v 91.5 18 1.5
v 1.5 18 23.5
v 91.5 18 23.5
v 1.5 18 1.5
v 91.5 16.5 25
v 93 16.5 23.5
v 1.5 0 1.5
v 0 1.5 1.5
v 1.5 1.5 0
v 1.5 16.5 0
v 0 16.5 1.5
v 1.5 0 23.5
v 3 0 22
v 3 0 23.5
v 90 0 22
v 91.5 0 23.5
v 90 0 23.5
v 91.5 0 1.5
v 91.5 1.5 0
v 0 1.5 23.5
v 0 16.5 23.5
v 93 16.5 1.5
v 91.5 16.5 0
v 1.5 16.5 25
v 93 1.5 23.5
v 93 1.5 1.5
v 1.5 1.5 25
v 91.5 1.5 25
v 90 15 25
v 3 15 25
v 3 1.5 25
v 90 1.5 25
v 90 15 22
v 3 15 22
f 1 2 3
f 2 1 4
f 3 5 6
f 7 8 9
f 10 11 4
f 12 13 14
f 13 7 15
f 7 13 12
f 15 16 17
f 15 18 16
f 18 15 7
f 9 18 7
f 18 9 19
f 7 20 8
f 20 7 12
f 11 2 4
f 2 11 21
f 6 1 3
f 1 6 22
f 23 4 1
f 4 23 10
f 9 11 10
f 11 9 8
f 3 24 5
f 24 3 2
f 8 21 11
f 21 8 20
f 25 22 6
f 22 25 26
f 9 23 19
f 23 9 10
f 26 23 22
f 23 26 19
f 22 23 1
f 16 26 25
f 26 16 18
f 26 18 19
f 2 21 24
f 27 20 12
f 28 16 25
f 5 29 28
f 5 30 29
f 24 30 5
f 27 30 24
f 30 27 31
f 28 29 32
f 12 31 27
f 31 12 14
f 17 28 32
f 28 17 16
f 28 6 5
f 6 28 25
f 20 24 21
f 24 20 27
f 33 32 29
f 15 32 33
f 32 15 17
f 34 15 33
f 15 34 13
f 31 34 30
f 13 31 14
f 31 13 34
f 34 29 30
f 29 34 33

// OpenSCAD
// Qi-charger riser for the Galaxy Fold 8.
//
// Standalone solid block that the phone rests on top of. It's not attached
// to PhoneHolder.scad - it just sits on the table/charging pad and lifts
// the phone up by block_height so the phone's Qi coil lines up with the
// charger underneath. A thin lip traces 3 edges of the top face to keep
// the phone from sliding off; the 4th (long) side is left open/flush.
//
// Shape (top view of the lip, sitting on top of the solid block):
//
//   ┌───────────────────────────────────┐  <- closed lip (phone_width long)
//   │ lip                          lip  │     end lips (phone_depth long)
//   └───────────────────────────────────┘
//        ^ open long side - no lip here, flush with the block edge
//
// Built as a single chamfered outer block (outer_width x outer_depth x
// outer_height) with a notch subtracted from the top: everywhere except a
// `wall`-wide border strip on 3 sides gets cut down by `wall`, leaving that
// border standing proud as the lip. The notch is exactly the phone's
// footprint (phone_width x phone_depth), flush with the open edge.

// ============================================================
// PRINT PROFILE (see PRINTER.md for full slicer profile values)
// ------------------------------------------------------------
// Material:    PLA Basic — static desk furniture holding light phone weight
//               only; the 3mm lip is robust (unlike FastChargeRiser.scad's
//               fragile 0.5mm edge), so there's no toughness case for PETG
//               here. PLA prints cleaner and cheaper for a part like this.
// Nozzle:      0.4mm — no fine text/detail.
// Quality:     0.20mm Standard.
// Infill:      20% — solid block under light static load (a resting phone),
//               a small step above the 15% decorative default since it's a
//               daily-use object, not purely decorative.
// Orientation: print flat as modeled, base (outer_width x outer_depth
//               footprint) down — the only sane orientation for a block like
//               this.
// Overrides:   the bottom-edge chamfer (chamfer=1.5mm) shrinks the flat
//               bed-contact footprint slightly versus an unchamfered block —
//               if adhesion is marginal on the first layer, add a brim
//               rather than assuming the chamfered edge will stick fine.
// ============================================================

phone_width  = 87;    // phone footprint, X
phone_depth  = 15;    // phone footprint, Y
block_height = 22;    // how high the riser lifts the phone, Z
wall         = 3;   // lip thickness/height
chamfer      = 1.5;  // outer-edge chamfer (kept small - must be < wall/2 or the thin lip collapses)

outer_width  = phone_width + 2*wall;  // 88
outer_depth  = phone_depth + wall;    // 15.5 (lip only traces the closed long side)
outer_height = block_height + wall;   // 22.5

// octahedron used as the minkowski "brush" that chamfers every edge of a cube by 45 degrees
module octahedron(r) {
    polyhedron(
        points = [
            [ r, 0, 0], [-r, 0, 0],
            [ 0, r, 0], [ 0,-r, 0],
            [ 0, 0, r], [ 0, 0,-r]
        ],
        faces = [
            [0,2,4],[2,1,4],[1,3,4],[3,0,4],
            [0,3,5],[3,1,5],[1,2,5],[2,0,5]
        ]
    );
}

// drop-in replacement for cube(size) that chamfers all 12 edges by `c`
module chamfered_cube(size, c = chamfer) {
    minkowski() {
        translate([c, c, c])
        cube([size[0]-2*c, size[1]-2*c, size[2]-2*c]);
        octahedron(c);
    }
}

color("coral")
difference() {
    // single outer block, chamfered as one solid
    chamfered_cube([outer_width, outer_depth, outer_height]);

    // notch cut from the top, leaving the `wall`-wide border on 3 sides
    // standing proud as the lip; flush with the block edge on the open side
    translate([wall, 0, block_height])
        cube([phone_width, phone_depth, wall + 1]); // +1 so it clears the top face cleanly
}
